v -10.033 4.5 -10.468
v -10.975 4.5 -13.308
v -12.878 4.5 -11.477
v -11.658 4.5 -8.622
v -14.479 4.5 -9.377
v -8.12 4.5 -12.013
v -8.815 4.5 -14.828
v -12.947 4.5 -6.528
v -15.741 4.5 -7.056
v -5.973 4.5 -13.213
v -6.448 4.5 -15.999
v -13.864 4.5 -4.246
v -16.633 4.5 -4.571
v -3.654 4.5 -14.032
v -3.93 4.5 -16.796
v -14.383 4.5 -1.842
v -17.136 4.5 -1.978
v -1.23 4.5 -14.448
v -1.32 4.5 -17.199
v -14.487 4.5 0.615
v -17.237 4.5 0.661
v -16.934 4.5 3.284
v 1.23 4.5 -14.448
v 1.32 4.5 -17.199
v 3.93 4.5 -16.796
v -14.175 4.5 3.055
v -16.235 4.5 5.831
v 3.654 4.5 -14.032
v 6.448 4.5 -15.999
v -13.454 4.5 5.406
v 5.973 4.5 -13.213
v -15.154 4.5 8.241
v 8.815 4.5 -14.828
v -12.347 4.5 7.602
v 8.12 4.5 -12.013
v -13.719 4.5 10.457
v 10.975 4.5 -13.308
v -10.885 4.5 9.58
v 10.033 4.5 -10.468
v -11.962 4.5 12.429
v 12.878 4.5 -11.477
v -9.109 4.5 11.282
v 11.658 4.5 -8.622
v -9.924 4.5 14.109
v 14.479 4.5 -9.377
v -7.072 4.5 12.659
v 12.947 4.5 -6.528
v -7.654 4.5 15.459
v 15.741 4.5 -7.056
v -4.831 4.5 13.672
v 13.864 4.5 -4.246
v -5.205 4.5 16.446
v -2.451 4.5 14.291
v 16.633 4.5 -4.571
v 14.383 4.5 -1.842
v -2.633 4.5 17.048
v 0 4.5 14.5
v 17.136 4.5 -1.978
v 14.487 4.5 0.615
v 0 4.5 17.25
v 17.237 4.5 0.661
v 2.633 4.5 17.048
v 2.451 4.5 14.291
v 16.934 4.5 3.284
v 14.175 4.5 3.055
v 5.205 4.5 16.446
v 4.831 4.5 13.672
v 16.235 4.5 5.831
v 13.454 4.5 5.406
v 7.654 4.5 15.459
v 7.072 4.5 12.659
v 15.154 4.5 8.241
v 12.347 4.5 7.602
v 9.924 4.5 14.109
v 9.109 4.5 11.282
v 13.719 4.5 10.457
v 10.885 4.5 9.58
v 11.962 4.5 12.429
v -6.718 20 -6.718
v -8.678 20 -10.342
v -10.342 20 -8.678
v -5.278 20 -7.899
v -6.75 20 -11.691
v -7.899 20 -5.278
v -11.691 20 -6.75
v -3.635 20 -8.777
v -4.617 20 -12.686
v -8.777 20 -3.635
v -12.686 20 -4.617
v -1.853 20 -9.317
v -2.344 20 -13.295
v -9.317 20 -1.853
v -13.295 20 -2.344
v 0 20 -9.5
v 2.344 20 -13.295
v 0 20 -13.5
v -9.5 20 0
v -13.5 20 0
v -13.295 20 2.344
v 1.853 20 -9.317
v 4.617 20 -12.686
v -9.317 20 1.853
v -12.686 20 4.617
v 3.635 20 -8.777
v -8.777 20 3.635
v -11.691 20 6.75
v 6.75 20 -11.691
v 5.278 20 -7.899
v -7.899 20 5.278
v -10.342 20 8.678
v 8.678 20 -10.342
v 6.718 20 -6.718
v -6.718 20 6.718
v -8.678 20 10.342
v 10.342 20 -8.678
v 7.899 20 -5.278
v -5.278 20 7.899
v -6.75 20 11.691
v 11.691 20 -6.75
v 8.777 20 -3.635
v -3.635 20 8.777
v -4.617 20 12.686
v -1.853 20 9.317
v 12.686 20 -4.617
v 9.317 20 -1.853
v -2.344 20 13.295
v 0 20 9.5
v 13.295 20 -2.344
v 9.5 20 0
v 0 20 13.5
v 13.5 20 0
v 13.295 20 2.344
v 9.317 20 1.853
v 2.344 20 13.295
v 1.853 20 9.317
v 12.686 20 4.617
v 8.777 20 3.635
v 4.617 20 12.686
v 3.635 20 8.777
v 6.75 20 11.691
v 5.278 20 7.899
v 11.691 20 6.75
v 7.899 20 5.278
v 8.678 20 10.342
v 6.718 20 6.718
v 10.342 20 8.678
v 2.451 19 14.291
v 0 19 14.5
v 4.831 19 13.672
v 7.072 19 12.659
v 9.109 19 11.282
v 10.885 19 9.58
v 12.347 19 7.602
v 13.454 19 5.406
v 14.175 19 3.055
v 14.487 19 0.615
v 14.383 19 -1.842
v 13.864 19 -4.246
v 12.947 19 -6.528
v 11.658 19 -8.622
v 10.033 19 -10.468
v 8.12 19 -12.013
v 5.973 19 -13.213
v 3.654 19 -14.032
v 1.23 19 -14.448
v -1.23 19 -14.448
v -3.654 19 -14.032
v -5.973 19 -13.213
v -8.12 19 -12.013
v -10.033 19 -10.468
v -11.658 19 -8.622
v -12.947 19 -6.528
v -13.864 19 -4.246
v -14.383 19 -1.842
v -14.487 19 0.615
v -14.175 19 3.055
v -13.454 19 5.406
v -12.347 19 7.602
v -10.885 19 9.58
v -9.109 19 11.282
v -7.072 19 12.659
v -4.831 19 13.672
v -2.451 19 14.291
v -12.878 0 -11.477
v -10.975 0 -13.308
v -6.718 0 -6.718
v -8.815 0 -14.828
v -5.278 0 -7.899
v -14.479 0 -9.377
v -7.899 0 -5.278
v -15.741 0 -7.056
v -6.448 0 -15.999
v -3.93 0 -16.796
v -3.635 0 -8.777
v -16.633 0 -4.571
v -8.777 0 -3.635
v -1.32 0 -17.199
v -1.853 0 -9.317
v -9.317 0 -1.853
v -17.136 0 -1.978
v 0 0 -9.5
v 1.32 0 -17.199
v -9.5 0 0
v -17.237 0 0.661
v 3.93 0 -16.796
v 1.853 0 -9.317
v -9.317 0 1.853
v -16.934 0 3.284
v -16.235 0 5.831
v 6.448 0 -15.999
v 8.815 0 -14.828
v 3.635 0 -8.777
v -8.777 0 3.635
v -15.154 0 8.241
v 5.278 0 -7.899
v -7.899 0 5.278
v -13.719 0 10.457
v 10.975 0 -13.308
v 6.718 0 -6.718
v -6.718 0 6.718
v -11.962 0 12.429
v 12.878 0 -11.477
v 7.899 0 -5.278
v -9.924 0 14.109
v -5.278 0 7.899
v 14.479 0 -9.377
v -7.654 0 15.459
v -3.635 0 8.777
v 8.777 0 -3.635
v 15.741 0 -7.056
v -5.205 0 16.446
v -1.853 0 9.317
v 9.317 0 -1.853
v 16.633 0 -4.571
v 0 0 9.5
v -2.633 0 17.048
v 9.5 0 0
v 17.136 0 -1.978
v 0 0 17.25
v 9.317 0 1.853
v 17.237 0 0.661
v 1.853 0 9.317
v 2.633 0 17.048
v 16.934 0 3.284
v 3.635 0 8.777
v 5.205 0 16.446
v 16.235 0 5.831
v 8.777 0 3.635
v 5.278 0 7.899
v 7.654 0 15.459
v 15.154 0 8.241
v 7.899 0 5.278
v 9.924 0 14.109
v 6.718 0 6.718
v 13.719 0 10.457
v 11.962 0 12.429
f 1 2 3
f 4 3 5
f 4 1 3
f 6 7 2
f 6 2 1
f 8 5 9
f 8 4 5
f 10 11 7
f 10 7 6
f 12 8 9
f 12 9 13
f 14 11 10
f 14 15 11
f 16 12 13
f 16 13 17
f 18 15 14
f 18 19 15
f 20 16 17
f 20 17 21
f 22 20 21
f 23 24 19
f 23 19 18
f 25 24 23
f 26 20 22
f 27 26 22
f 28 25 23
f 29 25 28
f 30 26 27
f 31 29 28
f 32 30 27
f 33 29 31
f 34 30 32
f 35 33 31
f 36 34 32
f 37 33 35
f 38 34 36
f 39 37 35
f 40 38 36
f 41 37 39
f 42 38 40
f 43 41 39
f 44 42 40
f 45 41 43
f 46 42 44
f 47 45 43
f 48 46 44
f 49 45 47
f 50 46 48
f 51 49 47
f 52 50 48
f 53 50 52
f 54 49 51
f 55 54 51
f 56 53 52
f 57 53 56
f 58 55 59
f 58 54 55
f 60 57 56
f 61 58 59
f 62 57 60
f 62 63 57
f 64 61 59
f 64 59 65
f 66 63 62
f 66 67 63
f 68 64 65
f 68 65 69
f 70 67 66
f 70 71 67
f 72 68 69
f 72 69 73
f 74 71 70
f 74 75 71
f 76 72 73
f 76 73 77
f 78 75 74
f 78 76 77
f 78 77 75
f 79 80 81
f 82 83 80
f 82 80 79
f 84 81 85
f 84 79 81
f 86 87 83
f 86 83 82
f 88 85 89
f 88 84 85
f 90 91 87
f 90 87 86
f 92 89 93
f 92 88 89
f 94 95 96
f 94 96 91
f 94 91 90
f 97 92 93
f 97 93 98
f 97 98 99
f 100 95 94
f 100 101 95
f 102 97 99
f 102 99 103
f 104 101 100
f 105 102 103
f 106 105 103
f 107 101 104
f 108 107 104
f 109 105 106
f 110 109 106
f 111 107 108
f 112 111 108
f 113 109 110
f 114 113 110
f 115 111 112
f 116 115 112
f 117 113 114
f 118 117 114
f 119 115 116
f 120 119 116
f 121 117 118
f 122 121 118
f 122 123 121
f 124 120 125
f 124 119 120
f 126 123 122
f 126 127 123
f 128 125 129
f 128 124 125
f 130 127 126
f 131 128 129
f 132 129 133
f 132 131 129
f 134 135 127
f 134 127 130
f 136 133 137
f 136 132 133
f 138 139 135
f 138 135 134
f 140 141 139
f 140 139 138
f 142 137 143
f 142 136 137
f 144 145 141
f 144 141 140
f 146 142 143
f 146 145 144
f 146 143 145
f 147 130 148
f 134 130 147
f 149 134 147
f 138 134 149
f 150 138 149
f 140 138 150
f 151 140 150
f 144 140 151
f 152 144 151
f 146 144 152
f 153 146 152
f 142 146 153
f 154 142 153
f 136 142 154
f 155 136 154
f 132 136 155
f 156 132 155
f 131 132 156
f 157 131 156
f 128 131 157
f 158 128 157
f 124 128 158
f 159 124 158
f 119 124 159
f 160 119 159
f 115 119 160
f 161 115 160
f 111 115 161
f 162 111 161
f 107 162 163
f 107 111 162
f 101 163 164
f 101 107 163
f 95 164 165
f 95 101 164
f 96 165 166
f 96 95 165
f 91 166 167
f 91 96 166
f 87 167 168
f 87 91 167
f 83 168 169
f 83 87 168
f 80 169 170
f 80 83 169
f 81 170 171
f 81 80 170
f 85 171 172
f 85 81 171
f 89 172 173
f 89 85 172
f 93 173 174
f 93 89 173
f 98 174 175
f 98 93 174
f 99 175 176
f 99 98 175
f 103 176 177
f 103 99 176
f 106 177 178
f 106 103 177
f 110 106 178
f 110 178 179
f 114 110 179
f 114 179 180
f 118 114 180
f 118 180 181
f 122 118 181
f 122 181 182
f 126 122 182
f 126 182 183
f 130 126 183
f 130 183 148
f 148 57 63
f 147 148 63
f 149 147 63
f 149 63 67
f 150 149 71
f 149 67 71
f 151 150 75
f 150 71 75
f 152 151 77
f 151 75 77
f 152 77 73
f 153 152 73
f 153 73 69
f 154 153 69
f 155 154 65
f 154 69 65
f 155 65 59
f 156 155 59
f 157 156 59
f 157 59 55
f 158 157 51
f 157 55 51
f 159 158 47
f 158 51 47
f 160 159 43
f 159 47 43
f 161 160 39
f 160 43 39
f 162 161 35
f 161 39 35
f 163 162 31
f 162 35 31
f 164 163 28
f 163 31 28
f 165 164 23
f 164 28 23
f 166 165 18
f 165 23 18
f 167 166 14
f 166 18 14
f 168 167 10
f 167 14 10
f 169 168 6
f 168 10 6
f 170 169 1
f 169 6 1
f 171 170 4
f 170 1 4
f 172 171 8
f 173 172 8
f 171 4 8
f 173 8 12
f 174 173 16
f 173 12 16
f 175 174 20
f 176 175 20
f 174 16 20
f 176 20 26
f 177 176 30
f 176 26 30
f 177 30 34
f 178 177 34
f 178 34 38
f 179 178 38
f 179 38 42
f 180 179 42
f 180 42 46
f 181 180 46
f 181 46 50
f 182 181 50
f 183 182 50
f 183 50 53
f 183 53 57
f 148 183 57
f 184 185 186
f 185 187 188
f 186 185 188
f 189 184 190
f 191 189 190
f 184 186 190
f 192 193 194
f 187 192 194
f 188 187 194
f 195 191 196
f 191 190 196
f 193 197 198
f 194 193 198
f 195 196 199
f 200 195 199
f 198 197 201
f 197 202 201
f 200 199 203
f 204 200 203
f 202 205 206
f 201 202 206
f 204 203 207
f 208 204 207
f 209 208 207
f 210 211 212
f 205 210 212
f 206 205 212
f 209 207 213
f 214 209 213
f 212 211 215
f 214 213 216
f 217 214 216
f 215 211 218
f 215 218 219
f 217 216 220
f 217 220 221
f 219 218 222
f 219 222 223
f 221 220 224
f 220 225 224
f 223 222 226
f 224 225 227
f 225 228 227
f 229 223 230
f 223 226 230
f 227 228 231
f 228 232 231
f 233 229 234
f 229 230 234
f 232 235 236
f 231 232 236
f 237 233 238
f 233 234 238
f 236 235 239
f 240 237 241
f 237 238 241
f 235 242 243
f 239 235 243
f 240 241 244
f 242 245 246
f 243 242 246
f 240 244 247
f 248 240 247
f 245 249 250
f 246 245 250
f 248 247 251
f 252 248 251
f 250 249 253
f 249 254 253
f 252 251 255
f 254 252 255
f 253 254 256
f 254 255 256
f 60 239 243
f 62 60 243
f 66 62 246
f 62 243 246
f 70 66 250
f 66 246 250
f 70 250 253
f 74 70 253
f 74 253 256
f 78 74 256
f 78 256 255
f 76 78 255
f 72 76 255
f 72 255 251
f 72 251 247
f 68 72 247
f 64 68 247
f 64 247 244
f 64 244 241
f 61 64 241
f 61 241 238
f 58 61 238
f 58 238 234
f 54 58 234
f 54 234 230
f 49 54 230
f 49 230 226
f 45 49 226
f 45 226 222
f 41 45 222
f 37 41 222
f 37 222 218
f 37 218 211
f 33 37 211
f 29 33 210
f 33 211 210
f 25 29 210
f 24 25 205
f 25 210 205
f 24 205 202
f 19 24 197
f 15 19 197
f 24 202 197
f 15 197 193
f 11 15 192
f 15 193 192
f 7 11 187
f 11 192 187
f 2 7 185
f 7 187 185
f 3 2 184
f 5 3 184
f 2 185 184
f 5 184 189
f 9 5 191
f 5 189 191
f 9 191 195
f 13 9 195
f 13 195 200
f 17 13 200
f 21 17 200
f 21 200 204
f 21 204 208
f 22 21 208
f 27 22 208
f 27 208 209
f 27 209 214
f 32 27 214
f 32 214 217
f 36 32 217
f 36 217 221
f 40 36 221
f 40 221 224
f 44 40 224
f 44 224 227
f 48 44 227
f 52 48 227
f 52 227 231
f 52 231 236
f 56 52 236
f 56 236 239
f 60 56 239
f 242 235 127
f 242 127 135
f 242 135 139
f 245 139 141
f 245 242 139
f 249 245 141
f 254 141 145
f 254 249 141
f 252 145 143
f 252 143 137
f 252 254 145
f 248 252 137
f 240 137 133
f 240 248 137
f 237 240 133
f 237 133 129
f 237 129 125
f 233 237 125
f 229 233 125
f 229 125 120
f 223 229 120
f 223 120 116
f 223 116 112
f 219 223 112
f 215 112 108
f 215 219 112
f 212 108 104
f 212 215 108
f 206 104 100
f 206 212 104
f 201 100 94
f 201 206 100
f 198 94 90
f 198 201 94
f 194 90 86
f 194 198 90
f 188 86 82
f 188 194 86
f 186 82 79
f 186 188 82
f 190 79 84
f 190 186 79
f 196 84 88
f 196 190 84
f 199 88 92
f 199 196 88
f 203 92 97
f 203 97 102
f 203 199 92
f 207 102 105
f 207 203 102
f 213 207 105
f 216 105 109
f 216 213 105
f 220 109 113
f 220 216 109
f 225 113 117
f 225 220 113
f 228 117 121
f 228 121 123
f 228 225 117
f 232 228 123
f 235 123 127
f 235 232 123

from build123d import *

# Parameters (mm, degrees)
SKETCH1_R           = 17.25
SKETCH1_R_2         = 9.5
BOSS_EXTRUDE1_DEPTH = 20
CUT_EXTRUDE1_START  = -15.5
SKETCH2_R           = 17.25
SKETCH2_R_2         = 14.5
CUT_EXTRUDE1_DEPTH  = 15.5
CHAMFER1_SIZE       = 1


with BuildPart() as part:
    # Sketch1 → Boss-Extrude1 (new body)
    with BuildSketch(Plane(origin=(0, 0, 0), x_dir=(1, 0, 0), z_dir=(0, 1, 0))):
        with Locations(Location((0, 0, 0), (0, 0, 270))):
            Circle(SKETCH1_R)
        with Locations(Location((0, 0, 0), (0, 0, 270))):
            Circle(SKETCH1_R_2, mode=Mode.SUBTRACT)
    extrude(amount=BOSS_EXTRUDE1_DEPTH)

    # Sketch2 → Cut-Extrude1 (cut)
    with BuildSketch(Plane(origin=(0, 20, 0), x_dir=(1, 0, 0), z_dir=(0, 1, 0)).offset(CUT_EXTRUDE1_START)):
        with Locations(Location((0, 0, 0), (0, 0, 270))):
            Circle(SKETCH2_R)
        with Locations(Location((0, 0, 0), (0, 0, 270))):
            Circle(SKETCH2_R_2, mode=Mode.SUBTRACT)
    extrude(amount=CUT_EXTRUDE1_DEPTH, mode=Mode.SUBTRACT)

    # Chamfer1
    chamfer1_edges = [part.edges().sort_by_distance(p)[0] for p in [
        (0, 20, -14.5),
    ]]
    chamfer(chamfer1_edges, length=CHAMFER1_SIZE)


solid = part.part
